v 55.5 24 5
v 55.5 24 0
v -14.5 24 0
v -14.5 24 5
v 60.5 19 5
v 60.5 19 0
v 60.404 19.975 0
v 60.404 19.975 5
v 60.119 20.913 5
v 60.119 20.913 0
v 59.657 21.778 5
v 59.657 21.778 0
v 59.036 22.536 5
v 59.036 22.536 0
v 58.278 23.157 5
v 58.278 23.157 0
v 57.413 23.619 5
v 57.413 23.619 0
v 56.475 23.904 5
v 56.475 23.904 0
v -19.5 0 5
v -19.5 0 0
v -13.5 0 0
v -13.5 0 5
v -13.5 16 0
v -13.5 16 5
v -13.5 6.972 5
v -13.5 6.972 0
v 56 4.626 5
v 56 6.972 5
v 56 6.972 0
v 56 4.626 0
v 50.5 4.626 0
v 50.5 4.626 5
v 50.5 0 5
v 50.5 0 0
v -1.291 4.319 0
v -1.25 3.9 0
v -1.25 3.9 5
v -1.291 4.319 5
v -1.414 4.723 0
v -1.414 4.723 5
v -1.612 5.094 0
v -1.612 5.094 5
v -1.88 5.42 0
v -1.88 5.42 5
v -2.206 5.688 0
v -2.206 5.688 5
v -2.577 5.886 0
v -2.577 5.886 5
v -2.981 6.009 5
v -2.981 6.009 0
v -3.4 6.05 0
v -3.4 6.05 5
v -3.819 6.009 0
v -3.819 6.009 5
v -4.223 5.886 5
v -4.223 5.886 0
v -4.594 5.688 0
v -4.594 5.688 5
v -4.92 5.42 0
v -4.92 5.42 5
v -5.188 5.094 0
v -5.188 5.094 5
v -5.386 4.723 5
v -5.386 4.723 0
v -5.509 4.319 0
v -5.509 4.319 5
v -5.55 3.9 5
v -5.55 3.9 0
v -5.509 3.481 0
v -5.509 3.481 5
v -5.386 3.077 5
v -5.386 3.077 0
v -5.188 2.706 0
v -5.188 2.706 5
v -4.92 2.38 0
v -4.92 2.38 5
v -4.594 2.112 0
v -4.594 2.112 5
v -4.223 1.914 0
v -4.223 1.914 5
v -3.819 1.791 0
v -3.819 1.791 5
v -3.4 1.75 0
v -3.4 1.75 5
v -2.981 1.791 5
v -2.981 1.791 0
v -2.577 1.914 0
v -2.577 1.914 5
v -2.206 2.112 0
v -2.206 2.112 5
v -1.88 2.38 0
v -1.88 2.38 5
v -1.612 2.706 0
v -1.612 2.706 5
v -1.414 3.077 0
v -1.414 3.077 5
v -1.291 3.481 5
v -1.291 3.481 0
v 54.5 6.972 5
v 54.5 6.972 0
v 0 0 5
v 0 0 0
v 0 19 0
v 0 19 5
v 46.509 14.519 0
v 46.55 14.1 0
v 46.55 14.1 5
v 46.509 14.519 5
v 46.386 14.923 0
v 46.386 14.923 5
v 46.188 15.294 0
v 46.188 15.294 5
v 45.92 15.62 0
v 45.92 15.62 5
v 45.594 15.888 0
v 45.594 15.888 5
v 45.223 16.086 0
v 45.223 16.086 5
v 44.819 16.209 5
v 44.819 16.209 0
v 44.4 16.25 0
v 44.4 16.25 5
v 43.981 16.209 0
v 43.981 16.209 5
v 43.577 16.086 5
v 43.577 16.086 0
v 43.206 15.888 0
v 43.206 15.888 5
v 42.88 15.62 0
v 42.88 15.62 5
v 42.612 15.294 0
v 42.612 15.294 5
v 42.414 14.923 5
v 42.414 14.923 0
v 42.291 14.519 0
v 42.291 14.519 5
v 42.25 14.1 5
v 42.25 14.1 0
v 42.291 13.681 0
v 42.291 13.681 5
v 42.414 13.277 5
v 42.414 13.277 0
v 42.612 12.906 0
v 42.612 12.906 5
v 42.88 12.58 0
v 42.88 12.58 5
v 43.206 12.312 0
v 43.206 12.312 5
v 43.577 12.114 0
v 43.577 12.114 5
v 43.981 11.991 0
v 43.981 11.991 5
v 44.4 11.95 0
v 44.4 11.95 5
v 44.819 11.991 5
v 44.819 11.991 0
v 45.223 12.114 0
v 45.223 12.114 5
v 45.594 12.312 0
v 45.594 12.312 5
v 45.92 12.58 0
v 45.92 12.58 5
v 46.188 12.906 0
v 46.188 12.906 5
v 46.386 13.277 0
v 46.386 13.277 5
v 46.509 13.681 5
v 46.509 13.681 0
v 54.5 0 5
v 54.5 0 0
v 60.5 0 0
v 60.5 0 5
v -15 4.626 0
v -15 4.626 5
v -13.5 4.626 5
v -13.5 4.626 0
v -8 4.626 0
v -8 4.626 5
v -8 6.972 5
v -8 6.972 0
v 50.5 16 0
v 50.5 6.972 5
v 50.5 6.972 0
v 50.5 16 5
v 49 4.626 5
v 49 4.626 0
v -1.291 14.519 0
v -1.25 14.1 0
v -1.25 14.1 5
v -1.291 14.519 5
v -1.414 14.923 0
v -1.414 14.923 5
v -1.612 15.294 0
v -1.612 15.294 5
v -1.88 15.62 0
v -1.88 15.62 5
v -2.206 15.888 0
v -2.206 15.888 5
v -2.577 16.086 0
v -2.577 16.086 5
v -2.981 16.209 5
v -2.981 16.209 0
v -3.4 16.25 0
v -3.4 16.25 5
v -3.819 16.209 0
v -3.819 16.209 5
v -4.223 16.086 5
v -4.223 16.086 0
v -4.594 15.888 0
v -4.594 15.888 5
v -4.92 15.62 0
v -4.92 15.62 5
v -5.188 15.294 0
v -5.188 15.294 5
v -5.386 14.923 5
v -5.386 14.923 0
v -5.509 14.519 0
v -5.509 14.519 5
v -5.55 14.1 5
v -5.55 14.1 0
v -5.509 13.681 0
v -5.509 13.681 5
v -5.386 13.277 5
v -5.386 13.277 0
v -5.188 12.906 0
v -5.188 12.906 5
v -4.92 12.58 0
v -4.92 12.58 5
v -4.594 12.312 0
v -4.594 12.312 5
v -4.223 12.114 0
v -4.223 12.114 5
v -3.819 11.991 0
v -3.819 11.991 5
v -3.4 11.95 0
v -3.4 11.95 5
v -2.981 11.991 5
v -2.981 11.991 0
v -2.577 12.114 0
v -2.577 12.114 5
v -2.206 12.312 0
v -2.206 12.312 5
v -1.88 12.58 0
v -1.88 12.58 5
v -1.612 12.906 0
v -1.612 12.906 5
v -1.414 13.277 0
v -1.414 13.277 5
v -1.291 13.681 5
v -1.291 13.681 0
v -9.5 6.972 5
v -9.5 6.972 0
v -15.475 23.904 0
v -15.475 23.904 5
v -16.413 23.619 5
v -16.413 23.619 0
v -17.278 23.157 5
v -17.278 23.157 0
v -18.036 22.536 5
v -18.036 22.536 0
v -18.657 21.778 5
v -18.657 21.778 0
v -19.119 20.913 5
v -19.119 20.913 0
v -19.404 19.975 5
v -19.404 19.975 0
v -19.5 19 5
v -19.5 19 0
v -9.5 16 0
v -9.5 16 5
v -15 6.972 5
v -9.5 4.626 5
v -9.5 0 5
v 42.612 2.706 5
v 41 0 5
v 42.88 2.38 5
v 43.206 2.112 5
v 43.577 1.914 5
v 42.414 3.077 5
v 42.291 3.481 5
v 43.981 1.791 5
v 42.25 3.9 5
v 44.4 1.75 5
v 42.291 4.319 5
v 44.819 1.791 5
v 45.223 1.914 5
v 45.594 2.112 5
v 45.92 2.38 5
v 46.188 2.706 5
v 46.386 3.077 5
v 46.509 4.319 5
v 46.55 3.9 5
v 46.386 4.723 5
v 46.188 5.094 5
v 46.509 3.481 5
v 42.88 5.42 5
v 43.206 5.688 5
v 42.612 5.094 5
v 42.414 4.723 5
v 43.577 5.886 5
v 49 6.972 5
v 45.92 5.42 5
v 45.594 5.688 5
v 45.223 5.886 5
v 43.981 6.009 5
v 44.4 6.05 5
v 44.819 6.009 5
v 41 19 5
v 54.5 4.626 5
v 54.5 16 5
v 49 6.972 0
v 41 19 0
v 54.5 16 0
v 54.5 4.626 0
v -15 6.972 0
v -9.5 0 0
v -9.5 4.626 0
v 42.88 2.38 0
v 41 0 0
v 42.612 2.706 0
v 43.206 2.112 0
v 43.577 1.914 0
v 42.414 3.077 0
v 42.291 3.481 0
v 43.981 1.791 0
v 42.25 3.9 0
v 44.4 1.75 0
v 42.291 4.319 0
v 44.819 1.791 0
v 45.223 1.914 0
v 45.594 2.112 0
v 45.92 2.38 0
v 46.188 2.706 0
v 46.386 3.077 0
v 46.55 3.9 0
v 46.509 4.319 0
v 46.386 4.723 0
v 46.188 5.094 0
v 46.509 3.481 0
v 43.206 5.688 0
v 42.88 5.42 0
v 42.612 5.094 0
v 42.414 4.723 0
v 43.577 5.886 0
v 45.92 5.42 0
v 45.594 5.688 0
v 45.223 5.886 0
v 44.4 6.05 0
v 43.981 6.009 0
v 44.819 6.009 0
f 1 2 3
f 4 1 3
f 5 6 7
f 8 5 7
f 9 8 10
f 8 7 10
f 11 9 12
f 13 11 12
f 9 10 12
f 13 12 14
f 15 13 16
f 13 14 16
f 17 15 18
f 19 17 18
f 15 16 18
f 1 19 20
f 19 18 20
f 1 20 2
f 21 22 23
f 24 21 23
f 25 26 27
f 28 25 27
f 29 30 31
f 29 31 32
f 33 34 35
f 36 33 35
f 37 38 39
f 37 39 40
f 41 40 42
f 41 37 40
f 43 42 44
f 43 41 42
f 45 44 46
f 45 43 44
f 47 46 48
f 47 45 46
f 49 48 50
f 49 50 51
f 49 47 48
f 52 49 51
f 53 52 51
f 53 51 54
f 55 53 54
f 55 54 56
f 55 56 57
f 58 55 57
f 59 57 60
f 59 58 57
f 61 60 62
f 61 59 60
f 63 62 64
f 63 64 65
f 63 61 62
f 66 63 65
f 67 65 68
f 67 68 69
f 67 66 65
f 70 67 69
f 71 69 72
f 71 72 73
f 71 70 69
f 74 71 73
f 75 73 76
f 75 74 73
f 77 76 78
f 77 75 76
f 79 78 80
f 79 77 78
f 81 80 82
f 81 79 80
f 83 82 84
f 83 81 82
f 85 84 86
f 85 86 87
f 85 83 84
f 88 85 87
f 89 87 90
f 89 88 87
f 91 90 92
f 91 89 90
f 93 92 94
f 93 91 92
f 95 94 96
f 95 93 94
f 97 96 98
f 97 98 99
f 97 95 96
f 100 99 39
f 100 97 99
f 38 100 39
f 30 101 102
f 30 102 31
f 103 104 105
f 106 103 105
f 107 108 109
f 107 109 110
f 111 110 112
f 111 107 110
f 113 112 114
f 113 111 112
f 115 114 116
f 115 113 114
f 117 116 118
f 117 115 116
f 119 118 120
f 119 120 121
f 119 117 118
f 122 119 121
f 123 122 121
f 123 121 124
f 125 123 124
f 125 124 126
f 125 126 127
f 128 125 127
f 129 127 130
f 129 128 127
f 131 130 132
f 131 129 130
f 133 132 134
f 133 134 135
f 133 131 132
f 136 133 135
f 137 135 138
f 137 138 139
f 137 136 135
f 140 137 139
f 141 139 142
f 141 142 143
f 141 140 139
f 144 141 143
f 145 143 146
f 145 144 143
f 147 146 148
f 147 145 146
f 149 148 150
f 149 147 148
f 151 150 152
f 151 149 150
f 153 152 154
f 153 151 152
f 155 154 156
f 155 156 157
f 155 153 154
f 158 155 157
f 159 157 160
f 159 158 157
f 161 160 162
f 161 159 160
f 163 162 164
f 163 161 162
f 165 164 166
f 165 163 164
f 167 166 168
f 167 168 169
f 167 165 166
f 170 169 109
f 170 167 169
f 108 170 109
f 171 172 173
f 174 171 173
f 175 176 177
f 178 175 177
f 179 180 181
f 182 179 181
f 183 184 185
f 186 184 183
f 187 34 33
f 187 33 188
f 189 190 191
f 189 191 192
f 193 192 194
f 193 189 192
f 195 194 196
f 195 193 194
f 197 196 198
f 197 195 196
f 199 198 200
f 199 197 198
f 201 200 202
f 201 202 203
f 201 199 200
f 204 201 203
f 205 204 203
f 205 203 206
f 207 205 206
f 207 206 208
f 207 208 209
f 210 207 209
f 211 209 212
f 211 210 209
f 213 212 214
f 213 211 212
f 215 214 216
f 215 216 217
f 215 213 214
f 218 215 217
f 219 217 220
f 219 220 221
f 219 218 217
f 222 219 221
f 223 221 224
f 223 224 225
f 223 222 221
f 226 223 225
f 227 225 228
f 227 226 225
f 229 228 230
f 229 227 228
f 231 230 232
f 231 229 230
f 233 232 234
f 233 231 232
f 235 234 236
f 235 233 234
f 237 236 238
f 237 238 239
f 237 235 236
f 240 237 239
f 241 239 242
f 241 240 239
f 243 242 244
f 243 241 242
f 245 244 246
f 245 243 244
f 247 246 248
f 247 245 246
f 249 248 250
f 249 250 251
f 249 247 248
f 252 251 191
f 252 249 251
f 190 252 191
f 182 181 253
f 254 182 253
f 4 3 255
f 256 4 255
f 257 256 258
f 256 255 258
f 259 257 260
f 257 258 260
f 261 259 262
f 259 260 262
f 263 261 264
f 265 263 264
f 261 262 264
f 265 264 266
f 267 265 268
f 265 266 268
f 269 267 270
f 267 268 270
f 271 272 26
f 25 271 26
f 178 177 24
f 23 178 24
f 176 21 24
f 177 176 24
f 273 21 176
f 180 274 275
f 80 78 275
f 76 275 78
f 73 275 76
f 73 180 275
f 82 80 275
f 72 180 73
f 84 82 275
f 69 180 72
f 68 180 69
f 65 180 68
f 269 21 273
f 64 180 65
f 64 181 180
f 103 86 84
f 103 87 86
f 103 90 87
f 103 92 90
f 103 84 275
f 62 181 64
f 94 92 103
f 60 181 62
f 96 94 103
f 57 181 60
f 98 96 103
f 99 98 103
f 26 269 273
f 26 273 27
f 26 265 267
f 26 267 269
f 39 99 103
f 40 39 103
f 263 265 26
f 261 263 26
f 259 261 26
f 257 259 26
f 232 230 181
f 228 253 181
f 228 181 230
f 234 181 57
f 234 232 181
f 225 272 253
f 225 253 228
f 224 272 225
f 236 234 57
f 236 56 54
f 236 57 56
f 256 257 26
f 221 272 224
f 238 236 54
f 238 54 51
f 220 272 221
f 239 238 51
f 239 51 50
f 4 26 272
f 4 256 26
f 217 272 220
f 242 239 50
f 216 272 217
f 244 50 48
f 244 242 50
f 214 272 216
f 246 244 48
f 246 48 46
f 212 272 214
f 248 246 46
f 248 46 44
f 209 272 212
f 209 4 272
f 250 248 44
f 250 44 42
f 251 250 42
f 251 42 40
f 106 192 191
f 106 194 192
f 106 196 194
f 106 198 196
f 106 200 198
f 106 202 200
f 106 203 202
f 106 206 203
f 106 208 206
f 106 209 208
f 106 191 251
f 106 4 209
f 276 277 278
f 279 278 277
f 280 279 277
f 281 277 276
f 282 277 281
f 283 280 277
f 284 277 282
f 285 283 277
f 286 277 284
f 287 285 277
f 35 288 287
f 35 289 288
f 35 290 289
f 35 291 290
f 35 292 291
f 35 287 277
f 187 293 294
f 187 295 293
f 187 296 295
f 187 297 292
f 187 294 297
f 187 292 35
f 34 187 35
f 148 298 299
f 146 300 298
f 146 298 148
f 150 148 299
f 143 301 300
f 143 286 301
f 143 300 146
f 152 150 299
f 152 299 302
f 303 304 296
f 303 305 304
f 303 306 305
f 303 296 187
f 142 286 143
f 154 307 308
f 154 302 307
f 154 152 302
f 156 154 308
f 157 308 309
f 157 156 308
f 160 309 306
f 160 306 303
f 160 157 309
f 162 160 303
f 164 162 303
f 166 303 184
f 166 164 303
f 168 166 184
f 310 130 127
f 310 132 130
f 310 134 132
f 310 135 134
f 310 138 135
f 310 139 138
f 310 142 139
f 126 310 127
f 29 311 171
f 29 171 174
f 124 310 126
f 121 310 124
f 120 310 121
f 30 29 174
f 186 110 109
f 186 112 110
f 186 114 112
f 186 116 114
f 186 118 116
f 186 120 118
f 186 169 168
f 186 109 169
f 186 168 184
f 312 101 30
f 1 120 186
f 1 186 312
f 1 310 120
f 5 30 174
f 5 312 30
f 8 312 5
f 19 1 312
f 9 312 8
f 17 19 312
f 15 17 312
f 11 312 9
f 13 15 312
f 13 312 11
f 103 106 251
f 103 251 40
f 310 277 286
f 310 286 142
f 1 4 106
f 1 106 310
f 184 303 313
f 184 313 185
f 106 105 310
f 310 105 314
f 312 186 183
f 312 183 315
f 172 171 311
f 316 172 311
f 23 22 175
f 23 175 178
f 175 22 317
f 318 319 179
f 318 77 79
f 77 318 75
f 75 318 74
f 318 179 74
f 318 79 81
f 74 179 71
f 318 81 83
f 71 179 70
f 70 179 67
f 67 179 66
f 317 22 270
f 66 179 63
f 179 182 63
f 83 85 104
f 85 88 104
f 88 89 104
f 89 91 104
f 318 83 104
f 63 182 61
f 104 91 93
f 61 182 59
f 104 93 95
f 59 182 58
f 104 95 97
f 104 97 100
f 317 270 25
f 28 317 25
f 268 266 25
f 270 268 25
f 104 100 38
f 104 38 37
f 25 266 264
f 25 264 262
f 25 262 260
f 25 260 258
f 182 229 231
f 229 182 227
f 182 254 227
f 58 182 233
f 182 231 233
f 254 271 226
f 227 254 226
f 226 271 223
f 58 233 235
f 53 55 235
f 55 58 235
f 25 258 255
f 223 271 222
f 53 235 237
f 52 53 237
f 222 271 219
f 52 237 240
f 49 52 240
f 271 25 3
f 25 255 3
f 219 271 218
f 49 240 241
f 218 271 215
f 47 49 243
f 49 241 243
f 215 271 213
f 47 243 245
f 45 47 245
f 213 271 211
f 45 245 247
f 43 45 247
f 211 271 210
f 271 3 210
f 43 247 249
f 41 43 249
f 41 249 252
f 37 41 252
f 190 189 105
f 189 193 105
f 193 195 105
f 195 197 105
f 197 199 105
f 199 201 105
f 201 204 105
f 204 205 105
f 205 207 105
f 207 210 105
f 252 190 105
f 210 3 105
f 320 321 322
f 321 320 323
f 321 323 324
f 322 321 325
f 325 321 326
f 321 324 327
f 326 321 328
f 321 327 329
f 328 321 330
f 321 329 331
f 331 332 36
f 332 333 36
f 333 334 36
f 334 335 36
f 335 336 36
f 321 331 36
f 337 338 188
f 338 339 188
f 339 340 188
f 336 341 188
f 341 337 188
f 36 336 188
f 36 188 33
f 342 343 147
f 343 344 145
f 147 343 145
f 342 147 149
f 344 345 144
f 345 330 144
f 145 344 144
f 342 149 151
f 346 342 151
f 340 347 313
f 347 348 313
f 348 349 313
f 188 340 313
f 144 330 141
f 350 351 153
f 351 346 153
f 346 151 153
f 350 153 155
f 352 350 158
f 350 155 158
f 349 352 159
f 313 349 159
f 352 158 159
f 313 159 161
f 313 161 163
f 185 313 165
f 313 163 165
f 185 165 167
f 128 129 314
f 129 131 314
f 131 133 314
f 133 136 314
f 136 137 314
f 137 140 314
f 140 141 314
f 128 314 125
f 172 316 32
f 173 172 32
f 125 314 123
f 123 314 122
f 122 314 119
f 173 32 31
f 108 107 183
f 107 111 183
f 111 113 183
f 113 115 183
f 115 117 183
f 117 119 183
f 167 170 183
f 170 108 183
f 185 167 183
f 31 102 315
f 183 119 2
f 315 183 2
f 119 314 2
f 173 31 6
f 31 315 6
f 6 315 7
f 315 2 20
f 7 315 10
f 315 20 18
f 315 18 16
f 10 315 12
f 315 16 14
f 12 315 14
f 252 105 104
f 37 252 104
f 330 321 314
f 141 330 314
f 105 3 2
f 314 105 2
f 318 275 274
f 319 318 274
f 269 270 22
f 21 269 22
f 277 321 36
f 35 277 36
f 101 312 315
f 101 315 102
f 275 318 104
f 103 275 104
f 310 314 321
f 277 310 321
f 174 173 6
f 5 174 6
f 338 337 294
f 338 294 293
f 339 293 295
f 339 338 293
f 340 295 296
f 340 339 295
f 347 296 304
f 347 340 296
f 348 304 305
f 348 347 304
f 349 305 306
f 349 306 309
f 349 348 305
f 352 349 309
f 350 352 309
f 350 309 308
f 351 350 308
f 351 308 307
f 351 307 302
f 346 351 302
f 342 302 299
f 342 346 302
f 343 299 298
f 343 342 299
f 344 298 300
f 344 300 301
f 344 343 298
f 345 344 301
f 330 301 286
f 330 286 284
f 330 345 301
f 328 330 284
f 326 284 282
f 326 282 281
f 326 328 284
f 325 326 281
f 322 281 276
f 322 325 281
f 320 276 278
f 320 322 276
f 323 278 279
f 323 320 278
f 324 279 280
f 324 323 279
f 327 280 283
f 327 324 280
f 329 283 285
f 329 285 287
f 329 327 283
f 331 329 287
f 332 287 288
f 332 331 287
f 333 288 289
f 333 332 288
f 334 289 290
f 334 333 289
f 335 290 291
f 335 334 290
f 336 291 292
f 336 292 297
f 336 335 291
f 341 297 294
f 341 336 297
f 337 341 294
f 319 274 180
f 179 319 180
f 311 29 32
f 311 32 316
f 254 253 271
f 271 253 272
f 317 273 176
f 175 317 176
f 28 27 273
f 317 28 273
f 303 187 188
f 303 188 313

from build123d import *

# Parameters (mm, degrees)
ESQUISSE1_R             = 2.15
BOSS_EXTRU_1_DEPTH      = 5
ENL_V_MAT_EXTRU_2_DEPTH = 30


with BuildPart() as part:
    # Esquisse1 → Boss.-Extru.1 (new body)
    with BuildSketch(Plane.XY):
        with BuildLine():
            Line((-19.5, 0), (0, 0))
            Line((0, 0), (0, 19))
            Line((0, 19), (41, 19))
            Line((41, 19), (41, 0))
            Line((41, 0), (60.5, 0))
            Line((60.5, 0), (60.5, 19))
            ThreePointArc((60.5, 19), (59.035533906, 22.535533906), (55.5, 24))
            Line((55.5, 24), (-14.5, 24))
            ThreePointArc((-14.5, 24), (-18.035533906, 22.535533906), (-19.5, 19))
            Line((-19.5, 19), (-19.5, 0))
        make_face()
        with Locations((44.4, 14.1)):
            Circle(ESQUISSE1_R, mode=Mode.SUBTRACT)
        with Locations((44.4, 3.9)):
            Circle(ESQUISSE1_R, mode=Mode.SUBTRACT)
        with Locations((-3.4, 14.1)):
            Circle(ESQUISSE1_R, mode=Mode.SUBTRACT)
        with Locations((-3.4, 3.9)):
            Circle(ESQUISSE1_R, mode=Mode.SUBTRACT)
    extrude(amount=BOSS_EXTRU_1_DEPTH)

    # Esquisse3 → Enlèv. mat.-Extru.2 (cut)
    with BuildSketch(Plane.XY.offset(5)):
        Polygon((-9.5, 3.002605055), (-9.5, 4.625752713), (-8, 4.625752713), (-8, 6.971671519), (-9.5, 6.971671519), (-9.5, 16), (-13.5, 16), (-13.5, 6.971671519), (-15, 6.971671519), (-15, 4.625752713), (-13.5, 4.625752713), (-13.5, 3.002605055), (-13.5, 0), (-9.5, 0), align=None)
        Polygon((54.5, 0), (50.5, 0), (50.5, 3.002605055), (50.5, 4.625752713), (49, 4.625752713), (49, 6.971671519), (50.5, 6.971671519), (50.5, 16), (54.5, 16), (54.5, 6.971671519), (56, 6.971671519), (56, 4.625752713), (54.5, 4.625752713), (54.5, 3.002605055), align=None)
    extrude(amount=-ENL_V_MAT_EXTRU_2_DEPTH, mode=Mode.SUBTRACT)


solid = part.part
